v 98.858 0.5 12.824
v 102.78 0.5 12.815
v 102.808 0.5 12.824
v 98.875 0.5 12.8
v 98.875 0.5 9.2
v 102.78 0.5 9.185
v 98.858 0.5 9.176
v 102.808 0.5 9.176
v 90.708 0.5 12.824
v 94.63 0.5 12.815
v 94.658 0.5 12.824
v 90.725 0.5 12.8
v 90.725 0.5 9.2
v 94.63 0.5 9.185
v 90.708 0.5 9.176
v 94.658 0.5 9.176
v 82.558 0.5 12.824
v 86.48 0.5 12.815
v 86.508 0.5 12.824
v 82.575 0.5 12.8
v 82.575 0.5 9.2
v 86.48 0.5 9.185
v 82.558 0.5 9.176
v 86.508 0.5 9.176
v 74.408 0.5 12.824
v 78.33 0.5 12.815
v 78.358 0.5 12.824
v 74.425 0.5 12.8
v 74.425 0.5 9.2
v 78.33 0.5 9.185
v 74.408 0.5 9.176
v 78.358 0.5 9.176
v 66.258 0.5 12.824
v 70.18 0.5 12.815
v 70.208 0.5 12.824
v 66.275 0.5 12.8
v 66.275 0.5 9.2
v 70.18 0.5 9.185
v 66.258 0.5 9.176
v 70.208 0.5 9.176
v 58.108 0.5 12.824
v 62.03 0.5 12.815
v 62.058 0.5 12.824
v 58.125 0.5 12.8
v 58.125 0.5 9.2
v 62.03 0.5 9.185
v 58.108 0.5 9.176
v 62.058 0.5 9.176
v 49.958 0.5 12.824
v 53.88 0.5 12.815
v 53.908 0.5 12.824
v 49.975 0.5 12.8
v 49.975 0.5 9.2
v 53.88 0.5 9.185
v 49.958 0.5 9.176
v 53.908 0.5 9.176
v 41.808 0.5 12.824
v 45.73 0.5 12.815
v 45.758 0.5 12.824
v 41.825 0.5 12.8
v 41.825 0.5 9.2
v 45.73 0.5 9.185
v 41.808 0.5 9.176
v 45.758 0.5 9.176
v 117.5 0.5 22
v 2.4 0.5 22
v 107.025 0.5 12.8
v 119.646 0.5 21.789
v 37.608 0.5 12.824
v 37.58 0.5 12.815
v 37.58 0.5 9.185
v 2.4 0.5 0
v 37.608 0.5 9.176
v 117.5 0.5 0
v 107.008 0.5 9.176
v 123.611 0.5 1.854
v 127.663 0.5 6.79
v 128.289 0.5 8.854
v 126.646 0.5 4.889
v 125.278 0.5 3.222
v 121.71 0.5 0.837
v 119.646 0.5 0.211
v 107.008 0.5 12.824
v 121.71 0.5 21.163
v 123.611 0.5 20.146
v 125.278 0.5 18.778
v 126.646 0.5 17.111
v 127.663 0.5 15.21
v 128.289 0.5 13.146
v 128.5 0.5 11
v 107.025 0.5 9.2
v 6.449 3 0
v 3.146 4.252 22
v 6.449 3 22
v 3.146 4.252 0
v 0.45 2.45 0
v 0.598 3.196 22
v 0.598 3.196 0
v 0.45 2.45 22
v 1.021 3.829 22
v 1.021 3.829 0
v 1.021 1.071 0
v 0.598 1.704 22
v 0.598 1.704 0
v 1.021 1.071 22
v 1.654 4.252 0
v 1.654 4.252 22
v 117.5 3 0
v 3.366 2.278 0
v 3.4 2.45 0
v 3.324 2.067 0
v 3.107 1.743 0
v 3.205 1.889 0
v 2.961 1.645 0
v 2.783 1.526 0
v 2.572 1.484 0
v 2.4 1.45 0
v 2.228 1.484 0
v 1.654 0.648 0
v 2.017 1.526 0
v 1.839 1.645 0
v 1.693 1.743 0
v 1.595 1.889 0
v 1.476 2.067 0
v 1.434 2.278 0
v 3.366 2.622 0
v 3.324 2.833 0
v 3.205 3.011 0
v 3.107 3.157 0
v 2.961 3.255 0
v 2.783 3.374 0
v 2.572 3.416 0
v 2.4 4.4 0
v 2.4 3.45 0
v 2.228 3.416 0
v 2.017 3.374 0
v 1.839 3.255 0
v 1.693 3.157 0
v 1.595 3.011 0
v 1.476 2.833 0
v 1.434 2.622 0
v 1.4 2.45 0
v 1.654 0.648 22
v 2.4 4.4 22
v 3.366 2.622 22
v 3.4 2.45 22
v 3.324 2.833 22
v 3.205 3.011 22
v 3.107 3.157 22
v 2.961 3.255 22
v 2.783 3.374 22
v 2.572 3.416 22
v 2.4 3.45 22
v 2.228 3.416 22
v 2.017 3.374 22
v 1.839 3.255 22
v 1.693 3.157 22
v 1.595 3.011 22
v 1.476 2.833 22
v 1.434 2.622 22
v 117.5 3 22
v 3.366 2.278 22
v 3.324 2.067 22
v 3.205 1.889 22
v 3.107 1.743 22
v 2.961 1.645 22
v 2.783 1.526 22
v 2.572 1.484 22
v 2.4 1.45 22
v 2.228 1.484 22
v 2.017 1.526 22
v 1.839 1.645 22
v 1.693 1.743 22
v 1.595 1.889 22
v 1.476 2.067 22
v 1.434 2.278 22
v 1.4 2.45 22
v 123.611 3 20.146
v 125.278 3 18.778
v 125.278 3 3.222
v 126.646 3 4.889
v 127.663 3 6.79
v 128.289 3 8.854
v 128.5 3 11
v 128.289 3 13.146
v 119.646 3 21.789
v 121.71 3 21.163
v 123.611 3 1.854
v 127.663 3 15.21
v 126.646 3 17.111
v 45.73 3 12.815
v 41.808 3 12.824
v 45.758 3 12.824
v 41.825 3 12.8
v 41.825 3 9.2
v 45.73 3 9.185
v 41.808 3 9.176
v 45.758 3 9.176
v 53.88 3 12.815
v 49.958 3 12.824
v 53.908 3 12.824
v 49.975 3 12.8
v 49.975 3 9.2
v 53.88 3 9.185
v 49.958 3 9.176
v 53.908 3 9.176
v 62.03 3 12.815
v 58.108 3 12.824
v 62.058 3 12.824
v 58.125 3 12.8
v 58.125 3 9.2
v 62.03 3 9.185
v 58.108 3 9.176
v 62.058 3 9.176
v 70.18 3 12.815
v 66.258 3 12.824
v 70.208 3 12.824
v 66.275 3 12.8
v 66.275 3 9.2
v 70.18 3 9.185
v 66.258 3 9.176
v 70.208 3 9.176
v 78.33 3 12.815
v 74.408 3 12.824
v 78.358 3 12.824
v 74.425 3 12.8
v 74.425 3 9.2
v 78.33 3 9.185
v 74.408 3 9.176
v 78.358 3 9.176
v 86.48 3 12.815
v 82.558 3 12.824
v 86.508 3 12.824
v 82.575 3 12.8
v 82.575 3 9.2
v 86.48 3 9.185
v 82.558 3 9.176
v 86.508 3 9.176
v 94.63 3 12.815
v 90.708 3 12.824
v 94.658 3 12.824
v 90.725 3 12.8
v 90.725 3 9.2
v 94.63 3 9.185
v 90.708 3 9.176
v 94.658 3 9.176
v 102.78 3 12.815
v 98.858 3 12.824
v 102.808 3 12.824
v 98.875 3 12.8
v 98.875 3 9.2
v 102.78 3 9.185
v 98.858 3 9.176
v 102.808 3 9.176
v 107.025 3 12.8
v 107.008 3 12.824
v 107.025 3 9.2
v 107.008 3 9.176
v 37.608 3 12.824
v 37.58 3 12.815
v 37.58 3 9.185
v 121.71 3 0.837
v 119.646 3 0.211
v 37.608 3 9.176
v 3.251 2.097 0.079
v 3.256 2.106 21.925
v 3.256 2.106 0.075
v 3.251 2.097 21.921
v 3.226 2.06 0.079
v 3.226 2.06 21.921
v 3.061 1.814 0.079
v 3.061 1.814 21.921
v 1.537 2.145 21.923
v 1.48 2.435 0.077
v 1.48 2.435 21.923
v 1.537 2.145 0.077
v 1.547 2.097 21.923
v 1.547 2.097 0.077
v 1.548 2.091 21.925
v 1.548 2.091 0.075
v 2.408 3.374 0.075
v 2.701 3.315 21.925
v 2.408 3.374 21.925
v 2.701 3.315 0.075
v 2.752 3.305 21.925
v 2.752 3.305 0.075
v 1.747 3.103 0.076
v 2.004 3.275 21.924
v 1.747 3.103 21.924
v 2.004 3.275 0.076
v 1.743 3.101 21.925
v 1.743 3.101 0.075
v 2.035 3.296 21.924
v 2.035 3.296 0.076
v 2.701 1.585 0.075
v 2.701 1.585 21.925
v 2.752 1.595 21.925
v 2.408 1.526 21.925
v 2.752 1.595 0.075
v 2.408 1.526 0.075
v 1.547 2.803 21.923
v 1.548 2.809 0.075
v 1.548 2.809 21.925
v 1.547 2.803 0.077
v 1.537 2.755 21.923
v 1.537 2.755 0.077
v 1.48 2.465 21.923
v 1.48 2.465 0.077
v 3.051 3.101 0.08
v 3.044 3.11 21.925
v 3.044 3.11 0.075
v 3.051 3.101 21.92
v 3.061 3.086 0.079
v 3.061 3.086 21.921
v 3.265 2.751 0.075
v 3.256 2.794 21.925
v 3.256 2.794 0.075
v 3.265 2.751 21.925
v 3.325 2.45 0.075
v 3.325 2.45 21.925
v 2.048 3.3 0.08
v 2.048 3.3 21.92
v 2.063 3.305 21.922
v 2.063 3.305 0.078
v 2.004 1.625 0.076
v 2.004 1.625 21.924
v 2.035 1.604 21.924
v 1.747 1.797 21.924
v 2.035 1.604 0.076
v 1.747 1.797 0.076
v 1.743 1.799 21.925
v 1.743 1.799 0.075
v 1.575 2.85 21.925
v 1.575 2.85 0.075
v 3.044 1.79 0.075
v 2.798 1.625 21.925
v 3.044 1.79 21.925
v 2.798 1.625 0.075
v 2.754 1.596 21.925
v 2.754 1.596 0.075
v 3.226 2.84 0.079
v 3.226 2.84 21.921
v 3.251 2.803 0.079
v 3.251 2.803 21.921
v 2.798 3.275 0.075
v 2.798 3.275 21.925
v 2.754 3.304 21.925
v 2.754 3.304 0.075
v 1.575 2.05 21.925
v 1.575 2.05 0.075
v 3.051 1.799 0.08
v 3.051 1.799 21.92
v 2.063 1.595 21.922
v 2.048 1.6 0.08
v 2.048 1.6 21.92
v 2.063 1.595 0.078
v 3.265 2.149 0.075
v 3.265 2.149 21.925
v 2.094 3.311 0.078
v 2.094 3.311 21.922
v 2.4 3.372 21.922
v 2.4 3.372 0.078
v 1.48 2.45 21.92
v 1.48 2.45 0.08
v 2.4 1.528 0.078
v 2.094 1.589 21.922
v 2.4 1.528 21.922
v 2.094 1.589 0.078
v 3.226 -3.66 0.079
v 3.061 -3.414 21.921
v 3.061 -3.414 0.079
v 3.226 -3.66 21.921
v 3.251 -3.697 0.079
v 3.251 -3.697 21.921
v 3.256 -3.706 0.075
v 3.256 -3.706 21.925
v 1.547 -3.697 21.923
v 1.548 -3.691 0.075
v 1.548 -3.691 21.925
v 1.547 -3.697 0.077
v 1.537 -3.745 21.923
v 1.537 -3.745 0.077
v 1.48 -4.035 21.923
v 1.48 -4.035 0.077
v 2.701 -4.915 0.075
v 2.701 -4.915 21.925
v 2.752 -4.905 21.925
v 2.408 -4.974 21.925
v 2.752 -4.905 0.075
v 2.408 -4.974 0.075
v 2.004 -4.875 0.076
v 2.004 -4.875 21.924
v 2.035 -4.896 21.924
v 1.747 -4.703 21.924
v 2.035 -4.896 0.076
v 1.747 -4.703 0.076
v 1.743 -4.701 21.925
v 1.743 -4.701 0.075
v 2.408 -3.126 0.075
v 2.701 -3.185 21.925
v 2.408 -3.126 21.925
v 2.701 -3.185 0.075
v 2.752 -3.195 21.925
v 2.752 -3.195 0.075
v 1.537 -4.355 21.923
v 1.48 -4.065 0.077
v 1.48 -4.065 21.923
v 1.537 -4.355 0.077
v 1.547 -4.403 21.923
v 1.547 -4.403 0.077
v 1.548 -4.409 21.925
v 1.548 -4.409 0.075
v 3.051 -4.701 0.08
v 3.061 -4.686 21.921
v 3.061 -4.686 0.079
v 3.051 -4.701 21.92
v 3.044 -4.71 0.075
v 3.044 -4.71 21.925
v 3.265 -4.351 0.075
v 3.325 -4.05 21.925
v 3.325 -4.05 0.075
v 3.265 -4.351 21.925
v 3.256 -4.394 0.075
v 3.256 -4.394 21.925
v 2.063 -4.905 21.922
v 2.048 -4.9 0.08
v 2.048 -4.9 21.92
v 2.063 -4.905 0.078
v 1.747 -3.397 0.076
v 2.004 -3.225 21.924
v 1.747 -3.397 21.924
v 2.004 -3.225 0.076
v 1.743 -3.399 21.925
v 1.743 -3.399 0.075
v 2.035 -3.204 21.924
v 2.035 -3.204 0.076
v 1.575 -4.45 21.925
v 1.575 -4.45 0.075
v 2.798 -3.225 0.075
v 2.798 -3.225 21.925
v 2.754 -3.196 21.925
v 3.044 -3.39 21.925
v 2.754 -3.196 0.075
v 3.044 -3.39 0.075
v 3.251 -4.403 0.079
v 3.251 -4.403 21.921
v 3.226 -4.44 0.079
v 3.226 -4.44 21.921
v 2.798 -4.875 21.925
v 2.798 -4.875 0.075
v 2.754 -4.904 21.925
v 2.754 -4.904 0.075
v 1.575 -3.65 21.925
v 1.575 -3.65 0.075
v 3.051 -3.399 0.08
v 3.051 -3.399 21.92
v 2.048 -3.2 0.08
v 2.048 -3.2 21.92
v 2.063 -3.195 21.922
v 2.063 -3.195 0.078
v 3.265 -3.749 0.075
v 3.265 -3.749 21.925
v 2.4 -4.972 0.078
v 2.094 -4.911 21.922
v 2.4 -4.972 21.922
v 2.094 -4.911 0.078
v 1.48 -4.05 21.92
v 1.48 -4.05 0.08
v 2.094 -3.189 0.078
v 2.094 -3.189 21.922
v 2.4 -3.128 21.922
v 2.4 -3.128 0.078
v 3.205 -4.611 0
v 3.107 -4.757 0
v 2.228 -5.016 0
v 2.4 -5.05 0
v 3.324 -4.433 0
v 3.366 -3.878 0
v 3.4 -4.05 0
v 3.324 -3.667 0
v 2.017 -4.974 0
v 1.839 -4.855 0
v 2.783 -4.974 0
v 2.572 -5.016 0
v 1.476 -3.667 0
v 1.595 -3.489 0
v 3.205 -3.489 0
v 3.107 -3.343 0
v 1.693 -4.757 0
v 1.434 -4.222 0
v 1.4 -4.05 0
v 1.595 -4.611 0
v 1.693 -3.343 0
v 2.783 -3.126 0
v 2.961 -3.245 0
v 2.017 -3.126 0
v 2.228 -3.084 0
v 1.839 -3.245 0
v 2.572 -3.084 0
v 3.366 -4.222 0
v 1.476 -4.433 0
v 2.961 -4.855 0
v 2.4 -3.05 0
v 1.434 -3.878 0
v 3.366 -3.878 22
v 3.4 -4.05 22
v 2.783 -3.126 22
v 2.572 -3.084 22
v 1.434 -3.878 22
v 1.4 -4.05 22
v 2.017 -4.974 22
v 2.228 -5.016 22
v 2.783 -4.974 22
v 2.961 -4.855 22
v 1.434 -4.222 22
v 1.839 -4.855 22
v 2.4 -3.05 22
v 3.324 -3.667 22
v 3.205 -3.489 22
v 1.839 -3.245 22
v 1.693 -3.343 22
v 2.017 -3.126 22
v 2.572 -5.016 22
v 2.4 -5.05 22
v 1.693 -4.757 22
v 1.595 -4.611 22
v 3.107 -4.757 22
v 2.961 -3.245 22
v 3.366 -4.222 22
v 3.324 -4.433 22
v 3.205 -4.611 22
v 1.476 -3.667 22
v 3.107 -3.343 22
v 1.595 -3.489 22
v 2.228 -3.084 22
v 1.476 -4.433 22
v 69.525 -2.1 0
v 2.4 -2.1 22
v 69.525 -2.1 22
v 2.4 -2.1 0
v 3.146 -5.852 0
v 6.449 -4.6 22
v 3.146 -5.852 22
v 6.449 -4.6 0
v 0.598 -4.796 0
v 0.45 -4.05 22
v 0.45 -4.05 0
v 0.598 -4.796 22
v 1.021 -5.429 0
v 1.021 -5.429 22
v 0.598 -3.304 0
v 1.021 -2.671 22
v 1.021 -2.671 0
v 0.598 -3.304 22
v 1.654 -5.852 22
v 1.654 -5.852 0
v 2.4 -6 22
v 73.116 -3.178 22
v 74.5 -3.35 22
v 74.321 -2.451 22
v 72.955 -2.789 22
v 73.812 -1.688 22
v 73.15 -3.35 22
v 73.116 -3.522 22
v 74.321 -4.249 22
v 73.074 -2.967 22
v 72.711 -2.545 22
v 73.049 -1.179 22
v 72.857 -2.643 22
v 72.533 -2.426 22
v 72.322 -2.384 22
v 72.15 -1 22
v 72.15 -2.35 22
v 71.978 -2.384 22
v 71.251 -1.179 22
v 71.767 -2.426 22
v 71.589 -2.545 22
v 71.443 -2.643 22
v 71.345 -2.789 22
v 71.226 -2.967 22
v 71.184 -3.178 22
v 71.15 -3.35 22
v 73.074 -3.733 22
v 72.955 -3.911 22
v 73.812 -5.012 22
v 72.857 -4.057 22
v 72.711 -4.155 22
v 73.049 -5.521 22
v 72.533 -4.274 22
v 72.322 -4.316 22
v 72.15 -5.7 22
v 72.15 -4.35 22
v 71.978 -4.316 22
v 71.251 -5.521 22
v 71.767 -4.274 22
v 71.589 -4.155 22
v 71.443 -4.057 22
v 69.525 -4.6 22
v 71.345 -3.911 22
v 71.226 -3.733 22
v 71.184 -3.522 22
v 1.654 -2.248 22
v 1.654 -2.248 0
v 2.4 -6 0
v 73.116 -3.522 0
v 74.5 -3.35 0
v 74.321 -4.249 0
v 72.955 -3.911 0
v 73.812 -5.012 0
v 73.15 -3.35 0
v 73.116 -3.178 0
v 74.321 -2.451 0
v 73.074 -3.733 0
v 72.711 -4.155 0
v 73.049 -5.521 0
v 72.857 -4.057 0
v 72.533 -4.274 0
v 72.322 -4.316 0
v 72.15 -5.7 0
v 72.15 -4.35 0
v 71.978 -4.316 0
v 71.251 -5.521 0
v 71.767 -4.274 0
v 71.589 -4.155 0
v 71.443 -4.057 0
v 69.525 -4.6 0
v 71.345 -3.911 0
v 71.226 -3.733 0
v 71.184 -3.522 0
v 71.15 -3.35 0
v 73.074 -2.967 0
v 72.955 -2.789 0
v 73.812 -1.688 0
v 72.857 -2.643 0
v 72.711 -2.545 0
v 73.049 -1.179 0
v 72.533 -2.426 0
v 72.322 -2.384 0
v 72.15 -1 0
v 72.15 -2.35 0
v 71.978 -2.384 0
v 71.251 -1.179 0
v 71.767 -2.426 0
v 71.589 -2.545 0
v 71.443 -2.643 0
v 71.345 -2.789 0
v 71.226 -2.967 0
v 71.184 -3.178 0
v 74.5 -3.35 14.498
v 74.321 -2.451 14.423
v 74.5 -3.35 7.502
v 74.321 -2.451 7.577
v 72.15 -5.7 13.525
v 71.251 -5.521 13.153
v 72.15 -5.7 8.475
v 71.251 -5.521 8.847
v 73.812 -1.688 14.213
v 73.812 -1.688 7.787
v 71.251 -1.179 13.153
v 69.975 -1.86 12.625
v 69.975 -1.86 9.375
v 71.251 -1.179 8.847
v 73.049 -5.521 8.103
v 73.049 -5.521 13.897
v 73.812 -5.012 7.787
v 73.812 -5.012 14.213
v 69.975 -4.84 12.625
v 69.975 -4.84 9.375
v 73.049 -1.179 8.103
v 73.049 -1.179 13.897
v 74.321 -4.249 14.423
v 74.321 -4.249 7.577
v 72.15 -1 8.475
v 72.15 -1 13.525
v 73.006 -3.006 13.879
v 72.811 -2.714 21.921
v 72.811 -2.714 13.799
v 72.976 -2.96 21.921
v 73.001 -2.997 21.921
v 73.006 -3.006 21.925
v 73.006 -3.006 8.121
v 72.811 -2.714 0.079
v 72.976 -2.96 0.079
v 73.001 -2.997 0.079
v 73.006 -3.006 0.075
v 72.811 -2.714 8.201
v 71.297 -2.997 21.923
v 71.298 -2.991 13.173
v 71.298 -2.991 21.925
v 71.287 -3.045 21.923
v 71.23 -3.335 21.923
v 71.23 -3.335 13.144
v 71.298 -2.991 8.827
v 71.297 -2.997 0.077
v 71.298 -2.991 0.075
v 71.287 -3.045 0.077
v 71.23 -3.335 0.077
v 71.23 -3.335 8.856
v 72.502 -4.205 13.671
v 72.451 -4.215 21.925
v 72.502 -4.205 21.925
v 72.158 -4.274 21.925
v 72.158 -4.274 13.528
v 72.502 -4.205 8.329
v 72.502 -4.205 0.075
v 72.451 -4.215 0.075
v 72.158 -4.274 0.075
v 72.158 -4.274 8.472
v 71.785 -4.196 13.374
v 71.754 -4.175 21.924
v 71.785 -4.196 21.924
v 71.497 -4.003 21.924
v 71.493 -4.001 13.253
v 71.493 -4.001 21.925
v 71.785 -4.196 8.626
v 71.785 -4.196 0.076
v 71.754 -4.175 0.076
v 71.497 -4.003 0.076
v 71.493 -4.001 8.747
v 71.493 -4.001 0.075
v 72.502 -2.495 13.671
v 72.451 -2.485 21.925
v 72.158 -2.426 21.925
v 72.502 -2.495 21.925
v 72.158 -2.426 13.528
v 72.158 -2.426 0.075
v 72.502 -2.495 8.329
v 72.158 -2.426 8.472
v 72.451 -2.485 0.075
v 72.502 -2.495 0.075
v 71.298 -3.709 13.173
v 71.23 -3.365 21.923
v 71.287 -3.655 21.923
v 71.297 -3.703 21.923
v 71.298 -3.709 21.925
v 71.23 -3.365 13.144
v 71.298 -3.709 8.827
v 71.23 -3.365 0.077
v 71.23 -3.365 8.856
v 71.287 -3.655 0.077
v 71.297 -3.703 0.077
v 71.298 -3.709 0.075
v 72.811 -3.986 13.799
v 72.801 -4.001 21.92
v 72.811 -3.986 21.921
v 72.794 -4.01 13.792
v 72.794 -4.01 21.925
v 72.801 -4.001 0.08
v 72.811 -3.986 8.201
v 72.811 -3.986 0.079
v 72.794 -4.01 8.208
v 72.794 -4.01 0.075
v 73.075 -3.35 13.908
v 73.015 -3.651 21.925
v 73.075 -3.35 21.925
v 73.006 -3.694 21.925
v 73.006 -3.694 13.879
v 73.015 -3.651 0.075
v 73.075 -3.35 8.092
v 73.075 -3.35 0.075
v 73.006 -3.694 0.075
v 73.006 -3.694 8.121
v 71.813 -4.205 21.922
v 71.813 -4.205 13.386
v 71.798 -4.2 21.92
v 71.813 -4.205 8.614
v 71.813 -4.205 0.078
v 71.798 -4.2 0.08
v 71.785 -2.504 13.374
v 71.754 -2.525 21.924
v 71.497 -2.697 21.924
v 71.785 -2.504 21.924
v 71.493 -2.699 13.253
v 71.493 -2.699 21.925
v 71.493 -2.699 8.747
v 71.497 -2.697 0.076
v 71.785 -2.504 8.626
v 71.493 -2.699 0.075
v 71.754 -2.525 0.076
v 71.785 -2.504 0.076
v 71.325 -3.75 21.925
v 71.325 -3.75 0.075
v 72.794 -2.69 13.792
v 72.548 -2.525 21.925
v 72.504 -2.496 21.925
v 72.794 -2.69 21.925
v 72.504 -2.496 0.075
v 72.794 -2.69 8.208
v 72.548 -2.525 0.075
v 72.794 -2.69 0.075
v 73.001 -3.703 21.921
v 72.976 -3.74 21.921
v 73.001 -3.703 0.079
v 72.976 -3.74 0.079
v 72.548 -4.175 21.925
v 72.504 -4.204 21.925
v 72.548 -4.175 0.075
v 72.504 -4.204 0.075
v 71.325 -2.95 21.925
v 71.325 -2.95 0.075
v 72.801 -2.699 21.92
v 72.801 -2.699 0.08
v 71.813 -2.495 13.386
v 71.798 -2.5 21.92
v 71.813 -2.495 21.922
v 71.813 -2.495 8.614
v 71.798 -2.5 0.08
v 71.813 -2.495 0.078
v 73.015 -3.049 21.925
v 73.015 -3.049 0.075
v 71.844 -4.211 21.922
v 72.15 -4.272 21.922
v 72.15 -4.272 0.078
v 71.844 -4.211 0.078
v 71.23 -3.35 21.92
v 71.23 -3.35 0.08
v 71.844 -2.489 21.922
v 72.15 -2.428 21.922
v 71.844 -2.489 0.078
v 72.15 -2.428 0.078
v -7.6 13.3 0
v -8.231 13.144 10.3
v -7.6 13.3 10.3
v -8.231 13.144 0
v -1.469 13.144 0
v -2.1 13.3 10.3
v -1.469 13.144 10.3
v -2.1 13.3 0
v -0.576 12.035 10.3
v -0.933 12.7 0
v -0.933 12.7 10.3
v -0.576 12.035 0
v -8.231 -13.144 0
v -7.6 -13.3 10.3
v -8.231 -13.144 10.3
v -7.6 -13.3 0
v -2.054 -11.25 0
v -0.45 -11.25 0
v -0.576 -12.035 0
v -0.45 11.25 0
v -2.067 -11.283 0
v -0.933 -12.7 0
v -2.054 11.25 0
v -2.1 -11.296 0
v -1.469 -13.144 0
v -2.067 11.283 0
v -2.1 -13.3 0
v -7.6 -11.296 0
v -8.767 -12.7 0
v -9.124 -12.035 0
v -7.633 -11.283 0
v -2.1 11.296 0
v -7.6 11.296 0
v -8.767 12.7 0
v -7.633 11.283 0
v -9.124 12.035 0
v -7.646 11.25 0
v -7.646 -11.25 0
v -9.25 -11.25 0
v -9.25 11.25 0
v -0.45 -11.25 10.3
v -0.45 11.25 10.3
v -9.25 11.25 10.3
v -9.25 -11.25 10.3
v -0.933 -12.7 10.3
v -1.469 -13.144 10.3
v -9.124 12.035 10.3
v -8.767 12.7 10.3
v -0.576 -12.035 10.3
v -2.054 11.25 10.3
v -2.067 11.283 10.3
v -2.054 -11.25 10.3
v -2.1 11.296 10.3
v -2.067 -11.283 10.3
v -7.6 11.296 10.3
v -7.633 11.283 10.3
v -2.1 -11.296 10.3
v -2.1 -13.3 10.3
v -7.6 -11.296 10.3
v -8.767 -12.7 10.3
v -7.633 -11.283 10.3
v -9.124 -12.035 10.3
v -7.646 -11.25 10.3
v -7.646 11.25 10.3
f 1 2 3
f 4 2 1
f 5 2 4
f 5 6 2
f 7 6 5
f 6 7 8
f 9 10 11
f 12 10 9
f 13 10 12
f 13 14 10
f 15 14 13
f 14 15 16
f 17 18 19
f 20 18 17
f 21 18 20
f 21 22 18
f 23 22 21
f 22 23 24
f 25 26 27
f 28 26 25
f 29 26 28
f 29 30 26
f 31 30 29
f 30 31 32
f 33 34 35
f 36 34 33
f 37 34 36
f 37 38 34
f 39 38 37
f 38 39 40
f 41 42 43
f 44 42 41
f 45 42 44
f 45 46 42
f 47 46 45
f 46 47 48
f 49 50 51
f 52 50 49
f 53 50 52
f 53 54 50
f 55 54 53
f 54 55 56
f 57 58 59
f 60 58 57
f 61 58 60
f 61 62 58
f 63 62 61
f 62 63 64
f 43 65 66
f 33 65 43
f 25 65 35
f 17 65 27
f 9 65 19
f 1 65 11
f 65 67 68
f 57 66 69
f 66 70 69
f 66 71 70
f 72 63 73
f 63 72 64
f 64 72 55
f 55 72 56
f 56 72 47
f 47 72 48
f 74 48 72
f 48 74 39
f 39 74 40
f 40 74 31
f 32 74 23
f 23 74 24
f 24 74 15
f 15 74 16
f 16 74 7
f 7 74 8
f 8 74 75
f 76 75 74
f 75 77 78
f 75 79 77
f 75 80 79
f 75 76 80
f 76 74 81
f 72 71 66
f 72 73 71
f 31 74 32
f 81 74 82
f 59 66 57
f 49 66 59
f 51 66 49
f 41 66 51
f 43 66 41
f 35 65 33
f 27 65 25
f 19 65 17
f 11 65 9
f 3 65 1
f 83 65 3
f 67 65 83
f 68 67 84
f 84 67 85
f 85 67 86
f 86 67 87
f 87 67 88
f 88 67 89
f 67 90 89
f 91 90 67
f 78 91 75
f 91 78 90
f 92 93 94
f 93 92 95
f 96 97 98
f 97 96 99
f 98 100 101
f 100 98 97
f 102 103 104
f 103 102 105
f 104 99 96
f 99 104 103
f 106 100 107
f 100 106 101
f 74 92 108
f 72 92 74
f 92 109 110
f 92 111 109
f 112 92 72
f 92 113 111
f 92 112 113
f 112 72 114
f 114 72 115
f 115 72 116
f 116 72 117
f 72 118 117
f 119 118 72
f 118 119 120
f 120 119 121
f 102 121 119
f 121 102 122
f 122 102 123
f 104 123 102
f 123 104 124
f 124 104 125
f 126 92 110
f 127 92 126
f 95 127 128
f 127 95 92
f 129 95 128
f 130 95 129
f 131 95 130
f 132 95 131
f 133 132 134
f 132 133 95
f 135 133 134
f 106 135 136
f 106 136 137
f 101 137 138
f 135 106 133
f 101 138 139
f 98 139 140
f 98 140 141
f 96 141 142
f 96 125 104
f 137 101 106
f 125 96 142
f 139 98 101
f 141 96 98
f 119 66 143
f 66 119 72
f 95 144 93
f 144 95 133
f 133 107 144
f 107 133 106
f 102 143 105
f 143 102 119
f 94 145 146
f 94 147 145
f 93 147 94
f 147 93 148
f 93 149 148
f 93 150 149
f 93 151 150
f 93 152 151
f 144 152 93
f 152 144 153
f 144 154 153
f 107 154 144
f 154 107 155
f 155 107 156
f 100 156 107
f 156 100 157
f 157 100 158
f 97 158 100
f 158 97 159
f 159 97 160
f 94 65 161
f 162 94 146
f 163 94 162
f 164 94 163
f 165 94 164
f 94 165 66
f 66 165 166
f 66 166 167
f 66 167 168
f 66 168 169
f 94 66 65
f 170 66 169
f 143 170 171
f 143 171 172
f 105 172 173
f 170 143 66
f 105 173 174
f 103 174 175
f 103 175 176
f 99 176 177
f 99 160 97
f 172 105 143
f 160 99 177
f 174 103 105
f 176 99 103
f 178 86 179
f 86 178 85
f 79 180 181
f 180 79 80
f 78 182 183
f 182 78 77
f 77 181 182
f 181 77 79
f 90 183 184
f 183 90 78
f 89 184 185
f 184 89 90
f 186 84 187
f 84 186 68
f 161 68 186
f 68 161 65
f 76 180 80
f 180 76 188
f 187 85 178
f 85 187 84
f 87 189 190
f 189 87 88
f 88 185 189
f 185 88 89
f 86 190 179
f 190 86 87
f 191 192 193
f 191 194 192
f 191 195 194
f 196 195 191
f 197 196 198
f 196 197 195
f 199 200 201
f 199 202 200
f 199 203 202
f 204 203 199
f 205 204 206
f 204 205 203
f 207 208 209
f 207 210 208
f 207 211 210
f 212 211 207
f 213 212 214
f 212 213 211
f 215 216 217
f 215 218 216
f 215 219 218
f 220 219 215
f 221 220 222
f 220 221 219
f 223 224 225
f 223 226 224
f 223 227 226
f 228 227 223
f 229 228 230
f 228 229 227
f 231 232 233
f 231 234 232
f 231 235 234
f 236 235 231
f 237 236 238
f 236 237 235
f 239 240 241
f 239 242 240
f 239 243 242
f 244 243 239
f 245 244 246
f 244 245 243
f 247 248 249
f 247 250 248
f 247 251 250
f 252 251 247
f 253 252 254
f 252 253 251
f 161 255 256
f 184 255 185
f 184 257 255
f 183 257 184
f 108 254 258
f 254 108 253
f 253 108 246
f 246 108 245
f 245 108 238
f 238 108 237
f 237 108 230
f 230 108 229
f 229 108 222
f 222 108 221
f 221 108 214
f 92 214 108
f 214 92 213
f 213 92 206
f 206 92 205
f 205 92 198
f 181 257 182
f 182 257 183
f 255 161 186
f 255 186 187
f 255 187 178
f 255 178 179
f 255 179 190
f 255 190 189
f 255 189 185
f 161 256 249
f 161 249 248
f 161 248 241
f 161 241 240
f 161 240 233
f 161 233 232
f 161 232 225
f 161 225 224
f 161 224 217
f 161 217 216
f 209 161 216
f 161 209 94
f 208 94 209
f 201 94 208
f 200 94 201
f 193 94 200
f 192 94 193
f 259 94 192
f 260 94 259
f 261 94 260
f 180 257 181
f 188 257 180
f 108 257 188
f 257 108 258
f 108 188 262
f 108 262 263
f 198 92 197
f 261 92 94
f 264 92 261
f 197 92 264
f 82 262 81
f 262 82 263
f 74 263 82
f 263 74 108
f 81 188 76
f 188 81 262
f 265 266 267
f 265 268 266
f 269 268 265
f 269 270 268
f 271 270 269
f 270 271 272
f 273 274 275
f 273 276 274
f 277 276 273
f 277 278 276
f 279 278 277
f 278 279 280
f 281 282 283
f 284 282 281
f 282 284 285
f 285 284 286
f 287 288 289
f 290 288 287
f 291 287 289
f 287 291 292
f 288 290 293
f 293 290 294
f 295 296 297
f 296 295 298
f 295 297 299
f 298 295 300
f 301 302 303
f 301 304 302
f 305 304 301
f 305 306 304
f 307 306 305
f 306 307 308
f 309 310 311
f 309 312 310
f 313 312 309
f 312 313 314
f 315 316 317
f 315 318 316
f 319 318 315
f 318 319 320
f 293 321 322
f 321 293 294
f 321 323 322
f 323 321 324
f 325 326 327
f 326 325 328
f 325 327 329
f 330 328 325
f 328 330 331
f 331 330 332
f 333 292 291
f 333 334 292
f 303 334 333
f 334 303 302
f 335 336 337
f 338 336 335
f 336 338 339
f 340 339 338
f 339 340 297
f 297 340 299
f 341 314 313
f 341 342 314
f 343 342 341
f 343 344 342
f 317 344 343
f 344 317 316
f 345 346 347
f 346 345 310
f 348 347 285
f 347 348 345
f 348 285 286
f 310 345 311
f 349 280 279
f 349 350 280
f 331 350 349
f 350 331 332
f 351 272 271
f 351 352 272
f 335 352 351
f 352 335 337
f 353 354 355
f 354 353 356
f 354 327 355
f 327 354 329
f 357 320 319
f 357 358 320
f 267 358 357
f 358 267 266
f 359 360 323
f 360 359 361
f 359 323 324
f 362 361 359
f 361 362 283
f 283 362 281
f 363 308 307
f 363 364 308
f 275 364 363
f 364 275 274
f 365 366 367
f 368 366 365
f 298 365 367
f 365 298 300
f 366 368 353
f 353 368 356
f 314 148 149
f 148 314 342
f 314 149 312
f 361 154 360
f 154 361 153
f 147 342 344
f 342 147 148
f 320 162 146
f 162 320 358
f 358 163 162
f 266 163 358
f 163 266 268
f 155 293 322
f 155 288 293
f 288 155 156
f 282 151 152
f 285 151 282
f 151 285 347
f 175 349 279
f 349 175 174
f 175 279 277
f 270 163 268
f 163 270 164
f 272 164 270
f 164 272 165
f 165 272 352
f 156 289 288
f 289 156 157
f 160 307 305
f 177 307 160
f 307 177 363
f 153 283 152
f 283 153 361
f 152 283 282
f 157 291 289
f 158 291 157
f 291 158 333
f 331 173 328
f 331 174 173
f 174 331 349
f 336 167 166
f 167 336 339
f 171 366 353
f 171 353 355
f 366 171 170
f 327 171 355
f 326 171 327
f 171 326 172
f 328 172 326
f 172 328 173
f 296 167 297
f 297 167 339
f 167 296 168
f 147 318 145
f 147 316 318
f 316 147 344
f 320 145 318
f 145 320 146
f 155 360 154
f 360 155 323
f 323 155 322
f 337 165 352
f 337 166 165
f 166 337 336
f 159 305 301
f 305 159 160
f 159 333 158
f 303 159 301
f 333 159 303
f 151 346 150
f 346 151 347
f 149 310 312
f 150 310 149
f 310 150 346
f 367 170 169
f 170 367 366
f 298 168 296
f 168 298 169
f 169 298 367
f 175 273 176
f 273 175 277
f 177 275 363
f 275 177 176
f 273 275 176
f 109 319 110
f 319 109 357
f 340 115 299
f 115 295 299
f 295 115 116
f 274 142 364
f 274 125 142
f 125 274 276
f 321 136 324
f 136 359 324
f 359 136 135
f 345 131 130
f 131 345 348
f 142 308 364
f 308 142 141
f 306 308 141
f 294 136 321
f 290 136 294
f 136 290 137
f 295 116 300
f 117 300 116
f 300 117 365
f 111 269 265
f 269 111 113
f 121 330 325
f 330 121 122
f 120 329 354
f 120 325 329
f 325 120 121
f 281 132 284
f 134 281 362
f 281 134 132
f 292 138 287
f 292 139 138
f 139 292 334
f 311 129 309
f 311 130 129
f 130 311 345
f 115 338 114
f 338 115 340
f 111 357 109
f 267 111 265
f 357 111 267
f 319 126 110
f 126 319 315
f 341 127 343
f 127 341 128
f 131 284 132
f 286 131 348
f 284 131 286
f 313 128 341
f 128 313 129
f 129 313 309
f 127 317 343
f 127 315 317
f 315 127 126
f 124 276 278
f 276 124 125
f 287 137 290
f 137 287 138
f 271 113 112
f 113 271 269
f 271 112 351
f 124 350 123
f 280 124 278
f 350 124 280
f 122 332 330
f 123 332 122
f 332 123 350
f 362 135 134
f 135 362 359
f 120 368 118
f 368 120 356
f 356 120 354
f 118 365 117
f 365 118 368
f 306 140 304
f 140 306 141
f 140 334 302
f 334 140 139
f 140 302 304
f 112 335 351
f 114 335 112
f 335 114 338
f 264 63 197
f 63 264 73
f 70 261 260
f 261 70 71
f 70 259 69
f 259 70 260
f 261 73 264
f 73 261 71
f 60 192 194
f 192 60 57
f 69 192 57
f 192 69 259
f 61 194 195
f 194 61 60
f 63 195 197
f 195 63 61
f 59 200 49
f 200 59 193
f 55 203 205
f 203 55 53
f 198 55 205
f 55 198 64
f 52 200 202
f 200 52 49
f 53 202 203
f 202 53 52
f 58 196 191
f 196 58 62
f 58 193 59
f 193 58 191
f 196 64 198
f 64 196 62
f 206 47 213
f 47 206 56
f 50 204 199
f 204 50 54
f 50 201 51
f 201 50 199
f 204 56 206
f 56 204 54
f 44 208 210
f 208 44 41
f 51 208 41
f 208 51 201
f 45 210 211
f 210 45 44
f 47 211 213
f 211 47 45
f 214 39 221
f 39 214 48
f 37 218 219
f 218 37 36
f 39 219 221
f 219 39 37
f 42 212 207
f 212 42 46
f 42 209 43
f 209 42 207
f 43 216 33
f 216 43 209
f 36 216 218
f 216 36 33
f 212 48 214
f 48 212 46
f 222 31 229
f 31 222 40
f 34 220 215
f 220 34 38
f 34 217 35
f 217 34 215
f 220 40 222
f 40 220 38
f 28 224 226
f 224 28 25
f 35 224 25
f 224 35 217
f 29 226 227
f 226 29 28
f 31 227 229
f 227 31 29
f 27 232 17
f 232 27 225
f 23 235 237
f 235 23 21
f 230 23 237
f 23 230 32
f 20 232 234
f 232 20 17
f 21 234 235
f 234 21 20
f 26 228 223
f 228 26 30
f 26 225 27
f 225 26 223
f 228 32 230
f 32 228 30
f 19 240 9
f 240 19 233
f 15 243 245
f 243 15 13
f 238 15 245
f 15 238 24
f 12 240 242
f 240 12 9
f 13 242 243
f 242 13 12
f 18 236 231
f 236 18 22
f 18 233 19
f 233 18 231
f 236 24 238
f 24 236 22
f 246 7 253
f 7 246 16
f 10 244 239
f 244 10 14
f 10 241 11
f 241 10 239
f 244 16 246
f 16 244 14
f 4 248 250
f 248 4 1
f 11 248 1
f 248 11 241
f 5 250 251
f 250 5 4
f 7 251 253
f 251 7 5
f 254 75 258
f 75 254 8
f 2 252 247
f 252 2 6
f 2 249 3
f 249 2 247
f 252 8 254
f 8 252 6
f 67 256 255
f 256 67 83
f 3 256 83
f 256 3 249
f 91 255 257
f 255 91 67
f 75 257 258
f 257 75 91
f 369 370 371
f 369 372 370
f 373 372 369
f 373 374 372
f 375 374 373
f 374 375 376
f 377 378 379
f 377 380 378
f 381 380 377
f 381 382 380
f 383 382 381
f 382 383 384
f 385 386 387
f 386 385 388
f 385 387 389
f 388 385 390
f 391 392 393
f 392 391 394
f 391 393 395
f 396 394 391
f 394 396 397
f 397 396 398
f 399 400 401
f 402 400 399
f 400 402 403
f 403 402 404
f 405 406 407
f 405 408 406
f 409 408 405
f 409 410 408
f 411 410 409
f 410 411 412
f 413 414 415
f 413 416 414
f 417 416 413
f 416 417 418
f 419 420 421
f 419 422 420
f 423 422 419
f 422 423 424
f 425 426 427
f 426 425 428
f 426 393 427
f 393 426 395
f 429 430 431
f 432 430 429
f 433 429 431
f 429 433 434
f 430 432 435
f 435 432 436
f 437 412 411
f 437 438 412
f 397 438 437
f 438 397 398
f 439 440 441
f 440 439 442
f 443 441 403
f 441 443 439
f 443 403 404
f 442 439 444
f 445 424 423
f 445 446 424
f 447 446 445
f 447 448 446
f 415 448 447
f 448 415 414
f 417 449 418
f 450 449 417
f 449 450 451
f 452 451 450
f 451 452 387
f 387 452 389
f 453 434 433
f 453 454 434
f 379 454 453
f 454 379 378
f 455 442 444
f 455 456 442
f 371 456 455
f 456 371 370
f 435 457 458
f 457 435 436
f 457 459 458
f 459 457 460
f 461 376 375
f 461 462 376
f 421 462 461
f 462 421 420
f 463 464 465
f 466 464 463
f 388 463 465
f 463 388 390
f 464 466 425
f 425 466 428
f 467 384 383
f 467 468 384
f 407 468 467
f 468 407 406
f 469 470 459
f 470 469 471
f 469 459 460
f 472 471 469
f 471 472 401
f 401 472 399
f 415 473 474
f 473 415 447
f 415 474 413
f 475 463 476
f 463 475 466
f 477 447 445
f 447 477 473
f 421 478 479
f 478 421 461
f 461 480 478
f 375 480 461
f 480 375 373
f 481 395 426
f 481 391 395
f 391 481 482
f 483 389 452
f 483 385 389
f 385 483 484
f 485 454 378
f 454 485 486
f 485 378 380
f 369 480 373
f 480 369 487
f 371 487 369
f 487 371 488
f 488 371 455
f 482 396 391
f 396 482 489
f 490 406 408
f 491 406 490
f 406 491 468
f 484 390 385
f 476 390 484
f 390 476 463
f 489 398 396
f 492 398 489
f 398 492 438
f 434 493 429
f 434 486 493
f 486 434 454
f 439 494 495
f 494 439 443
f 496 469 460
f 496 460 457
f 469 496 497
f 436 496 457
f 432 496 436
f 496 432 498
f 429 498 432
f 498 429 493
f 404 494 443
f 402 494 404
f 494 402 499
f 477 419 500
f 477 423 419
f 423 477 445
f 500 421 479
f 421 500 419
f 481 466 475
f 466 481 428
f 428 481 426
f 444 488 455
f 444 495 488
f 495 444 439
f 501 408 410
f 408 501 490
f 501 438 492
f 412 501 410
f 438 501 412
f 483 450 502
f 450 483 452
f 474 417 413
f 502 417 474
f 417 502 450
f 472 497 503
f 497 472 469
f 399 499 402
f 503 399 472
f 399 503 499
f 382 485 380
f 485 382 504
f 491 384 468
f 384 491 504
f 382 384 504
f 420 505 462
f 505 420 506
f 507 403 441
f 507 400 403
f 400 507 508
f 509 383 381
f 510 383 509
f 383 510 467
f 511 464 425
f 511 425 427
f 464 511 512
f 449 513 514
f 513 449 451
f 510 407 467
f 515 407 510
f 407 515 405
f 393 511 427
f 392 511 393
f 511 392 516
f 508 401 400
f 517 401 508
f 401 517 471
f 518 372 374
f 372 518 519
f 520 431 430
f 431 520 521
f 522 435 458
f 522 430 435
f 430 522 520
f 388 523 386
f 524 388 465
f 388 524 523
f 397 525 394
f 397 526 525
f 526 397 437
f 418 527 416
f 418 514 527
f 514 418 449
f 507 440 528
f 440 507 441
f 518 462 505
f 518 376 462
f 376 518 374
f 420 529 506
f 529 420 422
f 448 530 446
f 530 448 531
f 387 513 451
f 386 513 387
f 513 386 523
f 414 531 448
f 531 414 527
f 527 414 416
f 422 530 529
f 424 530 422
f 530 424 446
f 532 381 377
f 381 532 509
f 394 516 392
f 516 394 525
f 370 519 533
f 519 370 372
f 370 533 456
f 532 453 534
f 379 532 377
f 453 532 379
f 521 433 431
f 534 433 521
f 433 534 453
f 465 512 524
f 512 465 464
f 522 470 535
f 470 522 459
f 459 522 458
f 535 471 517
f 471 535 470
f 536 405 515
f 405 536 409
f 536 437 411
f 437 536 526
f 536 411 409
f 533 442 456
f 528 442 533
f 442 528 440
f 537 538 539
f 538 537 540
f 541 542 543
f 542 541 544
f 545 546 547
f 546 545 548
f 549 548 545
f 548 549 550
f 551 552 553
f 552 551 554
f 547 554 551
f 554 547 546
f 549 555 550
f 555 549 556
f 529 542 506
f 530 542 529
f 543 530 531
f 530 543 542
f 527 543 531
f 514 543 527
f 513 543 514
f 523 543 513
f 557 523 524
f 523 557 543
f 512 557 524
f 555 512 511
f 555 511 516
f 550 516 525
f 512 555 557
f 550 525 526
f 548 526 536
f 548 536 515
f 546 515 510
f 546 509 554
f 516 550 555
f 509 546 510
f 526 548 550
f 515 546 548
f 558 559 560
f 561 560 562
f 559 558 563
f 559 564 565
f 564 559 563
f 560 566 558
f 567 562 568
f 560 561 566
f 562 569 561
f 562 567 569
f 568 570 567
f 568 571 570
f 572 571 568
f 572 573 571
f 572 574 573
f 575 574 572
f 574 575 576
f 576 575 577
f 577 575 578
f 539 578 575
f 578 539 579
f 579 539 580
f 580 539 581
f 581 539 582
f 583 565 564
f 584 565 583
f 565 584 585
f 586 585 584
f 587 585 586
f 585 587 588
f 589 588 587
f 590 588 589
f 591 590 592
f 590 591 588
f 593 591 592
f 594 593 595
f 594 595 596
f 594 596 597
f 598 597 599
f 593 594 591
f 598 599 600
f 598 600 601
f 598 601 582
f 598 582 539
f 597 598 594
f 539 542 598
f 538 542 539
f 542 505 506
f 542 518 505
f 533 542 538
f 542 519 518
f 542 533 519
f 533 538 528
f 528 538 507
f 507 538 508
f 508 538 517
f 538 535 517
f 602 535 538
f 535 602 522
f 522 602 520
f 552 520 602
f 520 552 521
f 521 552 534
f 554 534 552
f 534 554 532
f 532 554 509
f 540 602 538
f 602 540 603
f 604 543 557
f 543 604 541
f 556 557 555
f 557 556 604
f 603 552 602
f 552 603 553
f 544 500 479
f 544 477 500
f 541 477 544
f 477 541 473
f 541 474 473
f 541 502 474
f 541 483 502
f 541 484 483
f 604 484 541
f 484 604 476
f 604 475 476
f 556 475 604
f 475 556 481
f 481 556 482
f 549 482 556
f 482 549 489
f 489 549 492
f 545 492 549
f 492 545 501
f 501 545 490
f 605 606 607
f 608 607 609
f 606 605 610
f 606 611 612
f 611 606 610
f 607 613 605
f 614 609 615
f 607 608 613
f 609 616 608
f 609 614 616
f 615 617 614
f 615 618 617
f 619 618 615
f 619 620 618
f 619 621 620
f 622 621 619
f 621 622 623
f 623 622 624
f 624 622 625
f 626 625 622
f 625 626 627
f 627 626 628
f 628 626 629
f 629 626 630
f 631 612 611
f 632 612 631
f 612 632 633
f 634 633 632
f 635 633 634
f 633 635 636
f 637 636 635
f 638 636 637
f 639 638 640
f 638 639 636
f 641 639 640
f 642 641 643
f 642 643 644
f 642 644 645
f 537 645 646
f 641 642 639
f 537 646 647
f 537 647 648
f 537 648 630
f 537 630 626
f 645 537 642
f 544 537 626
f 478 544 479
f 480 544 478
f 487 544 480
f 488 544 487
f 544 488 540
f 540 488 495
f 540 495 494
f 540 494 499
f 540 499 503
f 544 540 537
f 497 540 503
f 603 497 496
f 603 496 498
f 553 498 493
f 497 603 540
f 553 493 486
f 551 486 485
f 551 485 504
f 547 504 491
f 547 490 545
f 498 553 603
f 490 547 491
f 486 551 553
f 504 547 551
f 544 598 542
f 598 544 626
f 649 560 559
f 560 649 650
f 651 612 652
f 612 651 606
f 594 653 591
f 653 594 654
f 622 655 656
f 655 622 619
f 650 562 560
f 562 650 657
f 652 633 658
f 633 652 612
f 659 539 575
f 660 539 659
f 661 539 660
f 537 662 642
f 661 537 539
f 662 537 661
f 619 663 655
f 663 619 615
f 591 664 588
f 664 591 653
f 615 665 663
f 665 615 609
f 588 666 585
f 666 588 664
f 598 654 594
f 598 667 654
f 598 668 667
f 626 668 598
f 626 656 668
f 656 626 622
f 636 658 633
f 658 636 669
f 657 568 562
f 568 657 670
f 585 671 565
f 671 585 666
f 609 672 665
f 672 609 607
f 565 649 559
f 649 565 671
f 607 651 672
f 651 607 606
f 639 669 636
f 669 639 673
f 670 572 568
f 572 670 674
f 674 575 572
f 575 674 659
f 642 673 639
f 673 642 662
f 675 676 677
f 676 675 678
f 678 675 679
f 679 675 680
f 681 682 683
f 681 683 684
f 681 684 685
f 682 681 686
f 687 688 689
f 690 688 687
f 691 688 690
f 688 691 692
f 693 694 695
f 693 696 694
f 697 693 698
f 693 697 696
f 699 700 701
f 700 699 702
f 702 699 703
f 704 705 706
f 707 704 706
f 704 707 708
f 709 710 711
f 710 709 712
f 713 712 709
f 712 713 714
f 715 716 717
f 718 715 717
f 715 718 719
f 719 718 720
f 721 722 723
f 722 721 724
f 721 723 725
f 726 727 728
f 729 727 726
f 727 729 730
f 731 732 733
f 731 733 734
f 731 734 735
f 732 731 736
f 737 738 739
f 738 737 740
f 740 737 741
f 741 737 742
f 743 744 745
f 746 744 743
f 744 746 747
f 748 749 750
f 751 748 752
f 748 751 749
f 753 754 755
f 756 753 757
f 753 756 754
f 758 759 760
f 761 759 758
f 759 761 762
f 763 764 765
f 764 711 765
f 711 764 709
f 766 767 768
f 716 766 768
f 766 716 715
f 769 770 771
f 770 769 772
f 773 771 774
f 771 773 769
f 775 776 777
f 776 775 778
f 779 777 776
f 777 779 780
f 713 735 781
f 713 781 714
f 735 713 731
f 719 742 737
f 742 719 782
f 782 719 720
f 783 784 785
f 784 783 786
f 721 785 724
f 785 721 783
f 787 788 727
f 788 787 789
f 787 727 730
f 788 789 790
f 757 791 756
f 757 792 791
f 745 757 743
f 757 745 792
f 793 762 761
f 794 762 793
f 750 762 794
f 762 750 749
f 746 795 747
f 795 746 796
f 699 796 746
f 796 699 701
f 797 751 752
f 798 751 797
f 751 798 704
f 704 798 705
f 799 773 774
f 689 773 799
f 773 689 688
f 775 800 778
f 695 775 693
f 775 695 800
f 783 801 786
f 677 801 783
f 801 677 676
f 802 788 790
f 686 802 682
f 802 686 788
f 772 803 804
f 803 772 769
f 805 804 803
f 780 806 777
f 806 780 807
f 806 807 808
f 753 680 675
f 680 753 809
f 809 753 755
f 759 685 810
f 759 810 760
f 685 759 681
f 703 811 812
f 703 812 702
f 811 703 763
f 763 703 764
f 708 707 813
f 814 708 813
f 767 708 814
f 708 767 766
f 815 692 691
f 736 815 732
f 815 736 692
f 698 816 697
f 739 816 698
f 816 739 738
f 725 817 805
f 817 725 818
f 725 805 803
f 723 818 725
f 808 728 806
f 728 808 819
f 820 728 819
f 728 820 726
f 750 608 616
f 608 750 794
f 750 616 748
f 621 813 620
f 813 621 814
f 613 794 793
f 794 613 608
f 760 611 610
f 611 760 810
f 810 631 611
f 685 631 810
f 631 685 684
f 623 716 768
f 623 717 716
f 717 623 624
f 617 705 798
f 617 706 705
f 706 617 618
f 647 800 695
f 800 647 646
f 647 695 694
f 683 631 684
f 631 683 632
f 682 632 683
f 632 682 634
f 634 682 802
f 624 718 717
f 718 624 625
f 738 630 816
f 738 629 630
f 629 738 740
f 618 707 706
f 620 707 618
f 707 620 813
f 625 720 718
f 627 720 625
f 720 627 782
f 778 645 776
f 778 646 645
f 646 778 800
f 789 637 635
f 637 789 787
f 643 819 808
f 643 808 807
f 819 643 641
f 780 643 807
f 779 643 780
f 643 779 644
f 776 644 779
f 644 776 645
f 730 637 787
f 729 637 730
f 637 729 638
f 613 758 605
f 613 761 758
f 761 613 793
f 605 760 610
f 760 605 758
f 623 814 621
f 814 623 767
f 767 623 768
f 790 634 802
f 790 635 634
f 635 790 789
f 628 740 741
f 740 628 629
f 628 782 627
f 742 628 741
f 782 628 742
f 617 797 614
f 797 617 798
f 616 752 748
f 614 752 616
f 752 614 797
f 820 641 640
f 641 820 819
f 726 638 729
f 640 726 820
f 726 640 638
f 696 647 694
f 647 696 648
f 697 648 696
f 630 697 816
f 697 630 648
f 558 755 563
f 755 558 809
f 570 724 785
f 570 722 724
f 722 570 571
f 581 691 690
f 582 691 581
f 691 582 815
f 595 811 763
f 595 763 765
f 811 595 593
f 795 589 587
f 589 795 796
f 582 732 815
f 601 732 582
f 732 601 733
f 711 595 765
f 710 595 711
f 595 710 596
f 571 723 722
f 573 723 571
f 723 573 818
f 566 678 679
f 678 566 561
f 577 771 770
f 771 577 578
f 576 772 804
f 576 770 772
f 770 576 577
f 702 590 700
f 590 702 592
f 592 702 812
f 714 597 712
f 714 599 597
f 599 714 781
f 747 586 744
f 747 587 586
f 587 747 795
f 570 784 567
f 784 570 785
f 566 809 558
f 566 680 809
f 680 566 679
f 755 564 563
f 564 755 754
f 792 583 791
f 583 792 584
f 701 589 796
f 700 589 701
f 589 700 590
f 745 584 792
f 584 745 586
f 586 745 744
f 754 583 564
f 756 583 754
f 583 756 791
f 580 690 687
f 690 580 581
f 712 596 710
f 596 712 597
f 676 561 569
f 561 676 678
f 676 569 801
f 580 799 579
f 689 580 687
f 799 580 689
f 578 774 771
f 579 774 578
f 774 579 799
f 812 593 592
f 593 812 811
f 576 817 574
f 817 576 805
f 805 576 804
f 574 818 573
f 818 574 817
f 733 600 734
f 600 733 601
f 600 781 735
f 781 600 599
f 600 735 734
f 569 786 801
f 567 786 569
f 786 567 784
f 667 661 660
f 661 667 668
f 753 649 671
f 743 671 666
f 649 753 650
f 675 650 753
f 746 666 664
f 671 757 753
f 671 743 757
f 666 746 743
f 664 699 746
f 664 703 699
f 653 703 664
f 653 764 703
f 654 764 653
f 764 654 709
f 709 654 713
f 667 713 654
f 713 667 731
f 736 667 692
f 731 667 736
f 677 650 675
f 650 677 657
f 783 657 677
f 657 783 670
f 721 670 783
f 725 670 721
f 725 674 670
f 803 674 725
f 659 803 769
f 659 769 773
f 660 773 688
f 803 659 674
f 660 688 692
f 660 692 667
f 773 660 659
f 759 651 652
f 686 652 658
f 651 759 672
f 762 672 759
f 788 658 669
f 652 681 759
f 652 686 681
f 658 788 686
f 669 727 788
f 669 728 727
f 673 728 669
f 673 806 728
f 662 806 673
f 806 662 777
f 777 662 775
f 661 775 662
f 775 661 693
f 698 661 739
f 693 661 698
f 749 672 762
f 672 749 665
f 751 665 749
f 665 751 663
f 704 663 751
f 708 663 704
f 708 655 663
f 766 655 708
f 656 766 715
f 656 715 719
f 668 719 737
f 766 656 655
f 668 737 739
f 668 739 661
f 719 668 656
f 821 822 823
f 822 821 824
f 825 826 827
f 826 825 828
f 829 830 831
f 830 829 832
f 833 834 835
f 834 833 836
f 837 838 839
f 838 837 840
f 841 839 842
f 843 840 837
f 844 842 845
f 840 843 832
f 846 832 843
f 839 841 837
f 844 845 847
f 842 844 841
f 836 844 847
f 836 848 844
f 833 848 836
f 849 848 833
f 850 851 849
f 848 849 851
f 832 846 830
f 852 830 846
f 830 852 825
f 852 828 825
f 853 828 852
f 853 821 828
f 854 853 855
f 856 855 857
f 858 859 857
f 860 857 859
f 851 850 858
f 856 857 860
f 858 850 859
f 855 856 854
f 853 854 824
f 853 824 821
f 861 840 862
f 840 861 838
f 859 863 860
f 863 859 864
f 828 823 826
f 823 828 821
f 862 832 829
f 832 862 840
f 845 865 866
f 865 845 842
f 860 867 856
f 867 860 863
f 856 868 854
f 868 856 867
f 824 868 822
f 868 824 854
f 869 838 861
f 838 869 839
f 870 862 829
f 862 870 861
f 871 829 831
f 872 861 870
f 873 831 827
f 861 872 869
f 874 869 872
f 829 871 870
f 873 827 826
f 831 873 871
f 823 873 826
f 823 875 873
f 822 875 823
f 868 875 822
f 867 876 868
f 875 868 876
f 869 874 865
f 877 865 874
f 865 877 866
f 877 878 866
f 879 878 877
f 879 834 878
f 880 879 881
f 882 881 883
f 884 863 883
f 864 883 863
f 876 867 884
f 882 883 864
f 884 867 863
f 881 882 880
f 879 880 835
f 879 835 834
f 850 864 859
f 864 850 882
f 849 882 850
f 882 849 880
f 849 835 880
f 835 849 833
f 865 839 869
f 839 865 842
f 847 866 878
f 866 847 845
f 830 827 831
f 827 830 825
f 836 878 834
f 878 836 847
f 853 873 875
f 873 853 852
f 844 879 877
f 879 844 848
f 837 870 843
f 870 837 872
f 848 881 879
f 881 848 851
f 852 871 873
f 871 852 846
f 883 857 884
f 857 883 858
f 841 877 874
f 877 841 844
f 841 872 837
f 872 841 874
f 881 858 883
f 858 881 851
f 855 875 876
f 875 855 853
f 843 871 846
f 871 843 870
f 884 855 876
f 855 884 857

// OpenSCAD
// file: ../utilities/circular.scad
// arc functions
test_module="test circle_point_at_length";


function pi()=3.14159265358979323846;

function circle_circumference(r)=2*pi()*r;

// angle=360*l/circle_circumference(r)
// r*[cos(angle),sin(angle)]
function circle_point_at_length(r,l,offset=[0,0],rotate=0)=[r*cos(rotate+360*l/circle_circumference(r))
    , r*sin(rotate+360*l/circle_circumference(r)) ]+offset;

subdivisions=10;
path_length=128;
if(test_module=="test circle_point_at_length") {
    for(i=[0:subdivisions],bend_r=[30:20:200]) translate([0,0,bend_r]) union() {
        translate( circle_point_at_length(bend_r,i*path_length/subdivisions,rotate=-90,offset=[0,bend_r] ) ) {
            color([i/subdivisions,i/subdivisions,i/subdivisions]) cylinder(r1=2,r2=0,h=4);
        }
        if(i>0) hull() {
            translate( circle_point_at_length(bend_r,(i-1)*path_length/subdivisions,rotate=-90,offset=[0,bend_r] ) ) {
                cube();
            }
            translate( circle_point_at_length(bend_r,i*path_length/subdivisions,rotate=-90,offset=[0,bend_r] ) ) {
                cube();
            }
        }
    }
}
// main file
// Watch Strap Modules
// Measurements taken from Kickstarter Pebble Watch

use <../utilities/circular.scad>;

test_module="test watchstrap_adjustment_band";
test_module="test watchstrap_buckle_band";
test_module="test watchstrap_free_loop";
test_module="test plated";

global_min_wall_th=0.8;
global_min_clearance=0.5;
global_hole_grow=0.05;
global_hole_bevel=0.1;
global_overhang_angle=30.0;
global_debug=true;

adjustment_band_l=128.0;
adjustment_band_w=22.0;
adjustment_band_th=2.5;
adjustment_band_pin_d=1.8;
adjustment_band_pin_wall_th=1.0;
adjustment_band_hole_l=4.2;
adjustment_band_hole_w=3.6;
adjustment_band_hole_offset=37.10+adjustment_band_hole_l/2;
adjustment_band_hole_spacing=12.35-adjustment_band_hole_l;
adjustment_band_hole_count=9;

module watchstrap_adjustment_band(l=adjustment_band_l
    ,w=adjustment_band_w
    ,th=adjustment_band_th
    ,pin_d=adjustment_band_pin_d
    ,pin_wall_th=adjustment_band_pin_wall_th
    ,hole_l=adjustment_band_hole_l
    ,hole_w=adjustment_band_hole_w
    ,hole_offset=adjustment_band_hole_offset
    ,hole_spacing=adjustment_band_hole_spacing
    ,hole_count=adjustment_band_hole_count
    ,hole_bevel=global_hole_bevel
    ,hole_grow=global_hole_grow
    ,min_wall_th=global_min_wall_th
    ,debug=global_debug
) {
    if(debug) {
        echo("watchstrap_adjustment_band:");
        echo(str("            l = ",l));
        echo(str("            w = ",w));
        echo(str("           th = ",th));
        echo(str("        pin_d = ",pin_d));
        echo(str("  pin_wall_th = ",pin_wall_th));
        echo(str("       hole_l = ",hole_l));
        echo(str("       hole_w = ",hole_w));
        echo(str("  hole_offset = ",hole_offset));
        echo(str(" hole_spacing = ",hole_spacing));
        echo(str("   hole_count = ",hole_count));
        echo(str("   hole_bevel = ",hole_bevel));
        echo(str("    hole_grow = ",hole_grow));
        echo(str("  min_wall_th = ",min_wall_th));
    }
    difference() {
        union() {
            translate([pin_wall_th+pin_d/2,0,pin_wall_th+pin_d/2+hole_grow]) rotate([-90,0,0]) hull() {
                cylinder(d=2*pin_wall_th+pin_d+2*hole_grow,h=w,$fn=16,center=false);
                # cube([w/4,pin_d/2+pin_wall_th+hole_grow,w],center=false);
            }
            hull() {
                translate([pin_d/2+pin_wall_th,0]) cube([th,w,th],center=false);
                translate([l-w/2,w/2,0]) cylinder(d=w,h=th,$fn=32,center=false);
            }
        }
        translate([pin_wall_th+pin_d/2,0,pin_wall_th+pin_d/2+hole_grow]) rotate([-90,0,0]) {
            minkowski() {
                cylinder(d=pin_d,h=w,$fn=16,center=false);
                sphere(r=hole_grow/2);
            }
            cylinder(r1=pin_d/2+2*hole_bevel,r2=pin_d/2,h=2*hole_bevel,center=true,$fn=16);
            translate([0,0,w]) cylinder(r2=pin_d/2+2*hole_bevel,r1=pin_d/2,h=2*hole_bevel,center=true,$fn=16);
        }
        translate([hole_offset,w/2,0]) for(i=[0:hole_count-1]) minkowski() {
            translate([i*hole_spacing,0,th/2]) cube([hole_l,hole_w,2*th],center=true);
            sphere(r=hole_grow/2);
        }
    }
}

if(test_module=="test watchstrap_adjustment_band") {
    echo("Testing watchstrap_adjustment_band");
    watchstrap_adjustment_band();
}

buckle_band_l=74.0;
buckle_band_w=adjustment_band_w;
buckle_band_th=adjustment_band_th;
buckle_band_pin_d=adjustment_band_pin_d;
buckle_band_pin_wall_th=adjustment_band_pin_wall_th;
buckle_tongue_hole_w=3.2;
buckle_tongue_hole_notch=4.5;
buckle_tongue_pin_d=adjustment_band_pin_d;
buckle_tongue_pin_wall_th=1.4;

module watchstrap_buckle_band(l=buckle_band_l
    ,w=buckle_band_w
    ,th=buckle_band_th
    ,pin_d=buckle_band_pin_d
    ,pin_wall_th=buckle_band_pin_wall_th
    ,tongue_hole_w=buckle_tongue_hole_w
    ,tongue_hole_notch=buckle_tongue_hole_notch
    ,tongue_pin_d=buckle_tongue_pin_d
    ,tongue_pin_wall_th=buckle_tongue_pin_wall_th
    ,hole_bevel=global_hole_bevel
    ,hole_grow=global_hole_grow
    ,overhang_angle=global_overhang_angle
    ,min_wall_th=global_min_wall_th
    ,debug=global_debug
) {
    if(debug) {
        echo("watchstrap_buckle_band:");
        echo(str(" l = ",l));
        echo(str(" w = ",w));
        echo(str(" th = ",th));
        echo(str(" pin_d = ",pin_d));
        echo(str(" pin_wall_th = ",pin_wall_th));
        echo(str(" tongue_hole_w = ",tongue_hole_w));
        echo(str(" tongue_hole_notch = ",tongue_hole_notch));
        
    }
    difference() {
        union() {
            translate([pin_wall_th+pin_d/2,0,pin_wall_th+pin_d/2+hole_grow]) rotate([-90,0,0]) hull() {
                cylinder(d=2*pin_wall_th+pin_d+2*hole_grow,h=w,$fn=16,center=false);
                # cube([w/4,pin_d/2+pin_wall_th+hole_grow,w],center=false);
            }
            translate([pin_d/2+pin_wall_th,0]) cube([l-pin_d/2-pin_wall_th-tongue_pin_d/2-tongue_pin_wall_th,w,th],center=false);
            translate([l-tongue_pin_d/2-tongue_pin_wall_th-hole_grow,0,th/2]) hull() {
                rotate([-90,0,0]) cylinder(d=tongue_pin_d+2*tongue_pin_wall_th+2*hole_grow,h=w,$fn=16,center=false);
                #translate([-tongue_hole_notch+th,w/2,0]) cube([th/2,w,th],center=true);
            }
        }
        translate([pin_wall_th+pin_d/2,0,pin_wall_th+pin_d/2+hole_grow]) rotate([-90,0,0]) {
            minkowski() {
                cylinder(d=pin_d,h=w,$fn=16,center=false);
                sphere(r=hole_grow/2);
            }
            cylinder(r1=pin_d/2+2*hole_bevel,r2=pin_d/2,h=2*hole_bevel,center=true,$fn=16);
            translate([0,0,w]) cylinder(r2=pin_d/2+2*hole_bevel,r1=pin_d/2,h=2*hole_bevel,center=true,$fn=16);
        }
        translate([l-tongue_pin_d/2-tongue_pin_wall_th-hole_grow,0,th/2]) rotate([-90,0,0]) {
            minkowski() {
                cylinder(d=tongue_pin_d,h=w,$fn=16,center=false);
                sphere(r=hole_grow/2);
            }
            cylinder(r1=tongue_pin_d/2+2*hole_bevel,r2=tongue_pin_d/2,h=2*hole_bevel,center=true,$fn=16);
            translate([0,0,w]) cylinder(r2=tongue_pin_d/2+2*hole_bevel,r1=tongue_pin_d/2,h=2*hole_bevel,center=true,$fn=16);
        }
        # translate([l-tongue_hole_notch/2,w/2,th/2]) hull() {
            cube([tongue_hole_notch+hole_grow,tongue_hole_w+hole_grow,tongue_pin_d+2*tongue_pin_wall_th+4*hole_grow],center=true);
            if(overhang_angle>0) {
                translate([tongue_hole_notch/2+th/2,0,0]) cube([th,tongue_hole_w+2*hole_grow+2*tan(overhang_angle)*tongue_hole_w,tongue_pin_d+2*tongue_pin_wall_th+4*hole_grow],center=true);
            }
        }
    }
}

if(test_module=="test watchstrap_buckle_band") {
    echo("Testing watchstrap_buckle_band");
    watchstrap_buckle_band();
}

free_loop_inner_h=5.5;
free_loop_inner_w=22.5;
free_loop_l=10.3;
free_loop_surface_wall_th=1.60;
free_loop_edge_wall_th=2.0;

module watchstrap_free_loop(inner_h=free_loop_inner_h
    ,inner_w=free_loop_inner_w
    ,l=free_loop_l
    ,surface_wall_th=free_loop_surface_wall_th
    ,edge_wall_th=free_loop_edge_wall_th
    ,hole_bevel=global_hole_bevel
    ,hole_grow=global_hole_grow
    ,min_wall_th=global_min_wall_th
) {
    difference() {
        hull() {
            translate([inner_h/2,inner_w/2,0]) scale([surface_wall_th+hole_grow,edge_wall_th+hole_grow,1.0]) cylinder(r=1.0,h=l,$fn=16,center=false);
            translate([inner_h/2,-inner_w/2,0]) scale([surface_wall_th+hole_grow,edge_wall_th+hole_grow,1.0]) cylinder(r=1.0,h=l,$fn=16,center=false);
            translate([-inner_h/2,-inner_w/2,0]) scale([surface_wall_th+hole_grow,edge_wall_th+hole_grow,1.0]) cylinder(r=1.0,h=l,$fn=16,center=false);
            translate([-inner_h/2,inner_w/2,0]) scale([surface_wall_th+hole_grow,edge_wall_th+hole_grow,1.0]) cylinder(r=1.0,h=l,$fn=16,center=false);
        }
        minkowski() {
            translate([0,0,l/2]) cube([inner_h,inner_w,l],center=true);
            sphere(r=hole_grow,$fn=8);
        }
    }
}

if(test_module=="test watchstrap_free_loop") {
    echo("Testing watchstrap_free_loop");
    watchstrap_free_loop();
}

if(test_module=="test plated") {
    echo("Testing plating for printing");
    translate([global_min_clearance,global_min_clearance,adjustment_band_w]) rotate([-90,0,0]) watchstrap_adjustment_band();
    translate([global_min_clearance,-global_min_clearance-(buckle_tongue_pin_d/2+buckle_tongue_pin_wall_th/2),0]) rotate([90,0,0]) watchstrap_buckle_band();
    translate([-global_min_clearance-(free_loop_inner_h/2+free_loop_surface_wall_th),0,0]) watchstrap_free_loop();
}
